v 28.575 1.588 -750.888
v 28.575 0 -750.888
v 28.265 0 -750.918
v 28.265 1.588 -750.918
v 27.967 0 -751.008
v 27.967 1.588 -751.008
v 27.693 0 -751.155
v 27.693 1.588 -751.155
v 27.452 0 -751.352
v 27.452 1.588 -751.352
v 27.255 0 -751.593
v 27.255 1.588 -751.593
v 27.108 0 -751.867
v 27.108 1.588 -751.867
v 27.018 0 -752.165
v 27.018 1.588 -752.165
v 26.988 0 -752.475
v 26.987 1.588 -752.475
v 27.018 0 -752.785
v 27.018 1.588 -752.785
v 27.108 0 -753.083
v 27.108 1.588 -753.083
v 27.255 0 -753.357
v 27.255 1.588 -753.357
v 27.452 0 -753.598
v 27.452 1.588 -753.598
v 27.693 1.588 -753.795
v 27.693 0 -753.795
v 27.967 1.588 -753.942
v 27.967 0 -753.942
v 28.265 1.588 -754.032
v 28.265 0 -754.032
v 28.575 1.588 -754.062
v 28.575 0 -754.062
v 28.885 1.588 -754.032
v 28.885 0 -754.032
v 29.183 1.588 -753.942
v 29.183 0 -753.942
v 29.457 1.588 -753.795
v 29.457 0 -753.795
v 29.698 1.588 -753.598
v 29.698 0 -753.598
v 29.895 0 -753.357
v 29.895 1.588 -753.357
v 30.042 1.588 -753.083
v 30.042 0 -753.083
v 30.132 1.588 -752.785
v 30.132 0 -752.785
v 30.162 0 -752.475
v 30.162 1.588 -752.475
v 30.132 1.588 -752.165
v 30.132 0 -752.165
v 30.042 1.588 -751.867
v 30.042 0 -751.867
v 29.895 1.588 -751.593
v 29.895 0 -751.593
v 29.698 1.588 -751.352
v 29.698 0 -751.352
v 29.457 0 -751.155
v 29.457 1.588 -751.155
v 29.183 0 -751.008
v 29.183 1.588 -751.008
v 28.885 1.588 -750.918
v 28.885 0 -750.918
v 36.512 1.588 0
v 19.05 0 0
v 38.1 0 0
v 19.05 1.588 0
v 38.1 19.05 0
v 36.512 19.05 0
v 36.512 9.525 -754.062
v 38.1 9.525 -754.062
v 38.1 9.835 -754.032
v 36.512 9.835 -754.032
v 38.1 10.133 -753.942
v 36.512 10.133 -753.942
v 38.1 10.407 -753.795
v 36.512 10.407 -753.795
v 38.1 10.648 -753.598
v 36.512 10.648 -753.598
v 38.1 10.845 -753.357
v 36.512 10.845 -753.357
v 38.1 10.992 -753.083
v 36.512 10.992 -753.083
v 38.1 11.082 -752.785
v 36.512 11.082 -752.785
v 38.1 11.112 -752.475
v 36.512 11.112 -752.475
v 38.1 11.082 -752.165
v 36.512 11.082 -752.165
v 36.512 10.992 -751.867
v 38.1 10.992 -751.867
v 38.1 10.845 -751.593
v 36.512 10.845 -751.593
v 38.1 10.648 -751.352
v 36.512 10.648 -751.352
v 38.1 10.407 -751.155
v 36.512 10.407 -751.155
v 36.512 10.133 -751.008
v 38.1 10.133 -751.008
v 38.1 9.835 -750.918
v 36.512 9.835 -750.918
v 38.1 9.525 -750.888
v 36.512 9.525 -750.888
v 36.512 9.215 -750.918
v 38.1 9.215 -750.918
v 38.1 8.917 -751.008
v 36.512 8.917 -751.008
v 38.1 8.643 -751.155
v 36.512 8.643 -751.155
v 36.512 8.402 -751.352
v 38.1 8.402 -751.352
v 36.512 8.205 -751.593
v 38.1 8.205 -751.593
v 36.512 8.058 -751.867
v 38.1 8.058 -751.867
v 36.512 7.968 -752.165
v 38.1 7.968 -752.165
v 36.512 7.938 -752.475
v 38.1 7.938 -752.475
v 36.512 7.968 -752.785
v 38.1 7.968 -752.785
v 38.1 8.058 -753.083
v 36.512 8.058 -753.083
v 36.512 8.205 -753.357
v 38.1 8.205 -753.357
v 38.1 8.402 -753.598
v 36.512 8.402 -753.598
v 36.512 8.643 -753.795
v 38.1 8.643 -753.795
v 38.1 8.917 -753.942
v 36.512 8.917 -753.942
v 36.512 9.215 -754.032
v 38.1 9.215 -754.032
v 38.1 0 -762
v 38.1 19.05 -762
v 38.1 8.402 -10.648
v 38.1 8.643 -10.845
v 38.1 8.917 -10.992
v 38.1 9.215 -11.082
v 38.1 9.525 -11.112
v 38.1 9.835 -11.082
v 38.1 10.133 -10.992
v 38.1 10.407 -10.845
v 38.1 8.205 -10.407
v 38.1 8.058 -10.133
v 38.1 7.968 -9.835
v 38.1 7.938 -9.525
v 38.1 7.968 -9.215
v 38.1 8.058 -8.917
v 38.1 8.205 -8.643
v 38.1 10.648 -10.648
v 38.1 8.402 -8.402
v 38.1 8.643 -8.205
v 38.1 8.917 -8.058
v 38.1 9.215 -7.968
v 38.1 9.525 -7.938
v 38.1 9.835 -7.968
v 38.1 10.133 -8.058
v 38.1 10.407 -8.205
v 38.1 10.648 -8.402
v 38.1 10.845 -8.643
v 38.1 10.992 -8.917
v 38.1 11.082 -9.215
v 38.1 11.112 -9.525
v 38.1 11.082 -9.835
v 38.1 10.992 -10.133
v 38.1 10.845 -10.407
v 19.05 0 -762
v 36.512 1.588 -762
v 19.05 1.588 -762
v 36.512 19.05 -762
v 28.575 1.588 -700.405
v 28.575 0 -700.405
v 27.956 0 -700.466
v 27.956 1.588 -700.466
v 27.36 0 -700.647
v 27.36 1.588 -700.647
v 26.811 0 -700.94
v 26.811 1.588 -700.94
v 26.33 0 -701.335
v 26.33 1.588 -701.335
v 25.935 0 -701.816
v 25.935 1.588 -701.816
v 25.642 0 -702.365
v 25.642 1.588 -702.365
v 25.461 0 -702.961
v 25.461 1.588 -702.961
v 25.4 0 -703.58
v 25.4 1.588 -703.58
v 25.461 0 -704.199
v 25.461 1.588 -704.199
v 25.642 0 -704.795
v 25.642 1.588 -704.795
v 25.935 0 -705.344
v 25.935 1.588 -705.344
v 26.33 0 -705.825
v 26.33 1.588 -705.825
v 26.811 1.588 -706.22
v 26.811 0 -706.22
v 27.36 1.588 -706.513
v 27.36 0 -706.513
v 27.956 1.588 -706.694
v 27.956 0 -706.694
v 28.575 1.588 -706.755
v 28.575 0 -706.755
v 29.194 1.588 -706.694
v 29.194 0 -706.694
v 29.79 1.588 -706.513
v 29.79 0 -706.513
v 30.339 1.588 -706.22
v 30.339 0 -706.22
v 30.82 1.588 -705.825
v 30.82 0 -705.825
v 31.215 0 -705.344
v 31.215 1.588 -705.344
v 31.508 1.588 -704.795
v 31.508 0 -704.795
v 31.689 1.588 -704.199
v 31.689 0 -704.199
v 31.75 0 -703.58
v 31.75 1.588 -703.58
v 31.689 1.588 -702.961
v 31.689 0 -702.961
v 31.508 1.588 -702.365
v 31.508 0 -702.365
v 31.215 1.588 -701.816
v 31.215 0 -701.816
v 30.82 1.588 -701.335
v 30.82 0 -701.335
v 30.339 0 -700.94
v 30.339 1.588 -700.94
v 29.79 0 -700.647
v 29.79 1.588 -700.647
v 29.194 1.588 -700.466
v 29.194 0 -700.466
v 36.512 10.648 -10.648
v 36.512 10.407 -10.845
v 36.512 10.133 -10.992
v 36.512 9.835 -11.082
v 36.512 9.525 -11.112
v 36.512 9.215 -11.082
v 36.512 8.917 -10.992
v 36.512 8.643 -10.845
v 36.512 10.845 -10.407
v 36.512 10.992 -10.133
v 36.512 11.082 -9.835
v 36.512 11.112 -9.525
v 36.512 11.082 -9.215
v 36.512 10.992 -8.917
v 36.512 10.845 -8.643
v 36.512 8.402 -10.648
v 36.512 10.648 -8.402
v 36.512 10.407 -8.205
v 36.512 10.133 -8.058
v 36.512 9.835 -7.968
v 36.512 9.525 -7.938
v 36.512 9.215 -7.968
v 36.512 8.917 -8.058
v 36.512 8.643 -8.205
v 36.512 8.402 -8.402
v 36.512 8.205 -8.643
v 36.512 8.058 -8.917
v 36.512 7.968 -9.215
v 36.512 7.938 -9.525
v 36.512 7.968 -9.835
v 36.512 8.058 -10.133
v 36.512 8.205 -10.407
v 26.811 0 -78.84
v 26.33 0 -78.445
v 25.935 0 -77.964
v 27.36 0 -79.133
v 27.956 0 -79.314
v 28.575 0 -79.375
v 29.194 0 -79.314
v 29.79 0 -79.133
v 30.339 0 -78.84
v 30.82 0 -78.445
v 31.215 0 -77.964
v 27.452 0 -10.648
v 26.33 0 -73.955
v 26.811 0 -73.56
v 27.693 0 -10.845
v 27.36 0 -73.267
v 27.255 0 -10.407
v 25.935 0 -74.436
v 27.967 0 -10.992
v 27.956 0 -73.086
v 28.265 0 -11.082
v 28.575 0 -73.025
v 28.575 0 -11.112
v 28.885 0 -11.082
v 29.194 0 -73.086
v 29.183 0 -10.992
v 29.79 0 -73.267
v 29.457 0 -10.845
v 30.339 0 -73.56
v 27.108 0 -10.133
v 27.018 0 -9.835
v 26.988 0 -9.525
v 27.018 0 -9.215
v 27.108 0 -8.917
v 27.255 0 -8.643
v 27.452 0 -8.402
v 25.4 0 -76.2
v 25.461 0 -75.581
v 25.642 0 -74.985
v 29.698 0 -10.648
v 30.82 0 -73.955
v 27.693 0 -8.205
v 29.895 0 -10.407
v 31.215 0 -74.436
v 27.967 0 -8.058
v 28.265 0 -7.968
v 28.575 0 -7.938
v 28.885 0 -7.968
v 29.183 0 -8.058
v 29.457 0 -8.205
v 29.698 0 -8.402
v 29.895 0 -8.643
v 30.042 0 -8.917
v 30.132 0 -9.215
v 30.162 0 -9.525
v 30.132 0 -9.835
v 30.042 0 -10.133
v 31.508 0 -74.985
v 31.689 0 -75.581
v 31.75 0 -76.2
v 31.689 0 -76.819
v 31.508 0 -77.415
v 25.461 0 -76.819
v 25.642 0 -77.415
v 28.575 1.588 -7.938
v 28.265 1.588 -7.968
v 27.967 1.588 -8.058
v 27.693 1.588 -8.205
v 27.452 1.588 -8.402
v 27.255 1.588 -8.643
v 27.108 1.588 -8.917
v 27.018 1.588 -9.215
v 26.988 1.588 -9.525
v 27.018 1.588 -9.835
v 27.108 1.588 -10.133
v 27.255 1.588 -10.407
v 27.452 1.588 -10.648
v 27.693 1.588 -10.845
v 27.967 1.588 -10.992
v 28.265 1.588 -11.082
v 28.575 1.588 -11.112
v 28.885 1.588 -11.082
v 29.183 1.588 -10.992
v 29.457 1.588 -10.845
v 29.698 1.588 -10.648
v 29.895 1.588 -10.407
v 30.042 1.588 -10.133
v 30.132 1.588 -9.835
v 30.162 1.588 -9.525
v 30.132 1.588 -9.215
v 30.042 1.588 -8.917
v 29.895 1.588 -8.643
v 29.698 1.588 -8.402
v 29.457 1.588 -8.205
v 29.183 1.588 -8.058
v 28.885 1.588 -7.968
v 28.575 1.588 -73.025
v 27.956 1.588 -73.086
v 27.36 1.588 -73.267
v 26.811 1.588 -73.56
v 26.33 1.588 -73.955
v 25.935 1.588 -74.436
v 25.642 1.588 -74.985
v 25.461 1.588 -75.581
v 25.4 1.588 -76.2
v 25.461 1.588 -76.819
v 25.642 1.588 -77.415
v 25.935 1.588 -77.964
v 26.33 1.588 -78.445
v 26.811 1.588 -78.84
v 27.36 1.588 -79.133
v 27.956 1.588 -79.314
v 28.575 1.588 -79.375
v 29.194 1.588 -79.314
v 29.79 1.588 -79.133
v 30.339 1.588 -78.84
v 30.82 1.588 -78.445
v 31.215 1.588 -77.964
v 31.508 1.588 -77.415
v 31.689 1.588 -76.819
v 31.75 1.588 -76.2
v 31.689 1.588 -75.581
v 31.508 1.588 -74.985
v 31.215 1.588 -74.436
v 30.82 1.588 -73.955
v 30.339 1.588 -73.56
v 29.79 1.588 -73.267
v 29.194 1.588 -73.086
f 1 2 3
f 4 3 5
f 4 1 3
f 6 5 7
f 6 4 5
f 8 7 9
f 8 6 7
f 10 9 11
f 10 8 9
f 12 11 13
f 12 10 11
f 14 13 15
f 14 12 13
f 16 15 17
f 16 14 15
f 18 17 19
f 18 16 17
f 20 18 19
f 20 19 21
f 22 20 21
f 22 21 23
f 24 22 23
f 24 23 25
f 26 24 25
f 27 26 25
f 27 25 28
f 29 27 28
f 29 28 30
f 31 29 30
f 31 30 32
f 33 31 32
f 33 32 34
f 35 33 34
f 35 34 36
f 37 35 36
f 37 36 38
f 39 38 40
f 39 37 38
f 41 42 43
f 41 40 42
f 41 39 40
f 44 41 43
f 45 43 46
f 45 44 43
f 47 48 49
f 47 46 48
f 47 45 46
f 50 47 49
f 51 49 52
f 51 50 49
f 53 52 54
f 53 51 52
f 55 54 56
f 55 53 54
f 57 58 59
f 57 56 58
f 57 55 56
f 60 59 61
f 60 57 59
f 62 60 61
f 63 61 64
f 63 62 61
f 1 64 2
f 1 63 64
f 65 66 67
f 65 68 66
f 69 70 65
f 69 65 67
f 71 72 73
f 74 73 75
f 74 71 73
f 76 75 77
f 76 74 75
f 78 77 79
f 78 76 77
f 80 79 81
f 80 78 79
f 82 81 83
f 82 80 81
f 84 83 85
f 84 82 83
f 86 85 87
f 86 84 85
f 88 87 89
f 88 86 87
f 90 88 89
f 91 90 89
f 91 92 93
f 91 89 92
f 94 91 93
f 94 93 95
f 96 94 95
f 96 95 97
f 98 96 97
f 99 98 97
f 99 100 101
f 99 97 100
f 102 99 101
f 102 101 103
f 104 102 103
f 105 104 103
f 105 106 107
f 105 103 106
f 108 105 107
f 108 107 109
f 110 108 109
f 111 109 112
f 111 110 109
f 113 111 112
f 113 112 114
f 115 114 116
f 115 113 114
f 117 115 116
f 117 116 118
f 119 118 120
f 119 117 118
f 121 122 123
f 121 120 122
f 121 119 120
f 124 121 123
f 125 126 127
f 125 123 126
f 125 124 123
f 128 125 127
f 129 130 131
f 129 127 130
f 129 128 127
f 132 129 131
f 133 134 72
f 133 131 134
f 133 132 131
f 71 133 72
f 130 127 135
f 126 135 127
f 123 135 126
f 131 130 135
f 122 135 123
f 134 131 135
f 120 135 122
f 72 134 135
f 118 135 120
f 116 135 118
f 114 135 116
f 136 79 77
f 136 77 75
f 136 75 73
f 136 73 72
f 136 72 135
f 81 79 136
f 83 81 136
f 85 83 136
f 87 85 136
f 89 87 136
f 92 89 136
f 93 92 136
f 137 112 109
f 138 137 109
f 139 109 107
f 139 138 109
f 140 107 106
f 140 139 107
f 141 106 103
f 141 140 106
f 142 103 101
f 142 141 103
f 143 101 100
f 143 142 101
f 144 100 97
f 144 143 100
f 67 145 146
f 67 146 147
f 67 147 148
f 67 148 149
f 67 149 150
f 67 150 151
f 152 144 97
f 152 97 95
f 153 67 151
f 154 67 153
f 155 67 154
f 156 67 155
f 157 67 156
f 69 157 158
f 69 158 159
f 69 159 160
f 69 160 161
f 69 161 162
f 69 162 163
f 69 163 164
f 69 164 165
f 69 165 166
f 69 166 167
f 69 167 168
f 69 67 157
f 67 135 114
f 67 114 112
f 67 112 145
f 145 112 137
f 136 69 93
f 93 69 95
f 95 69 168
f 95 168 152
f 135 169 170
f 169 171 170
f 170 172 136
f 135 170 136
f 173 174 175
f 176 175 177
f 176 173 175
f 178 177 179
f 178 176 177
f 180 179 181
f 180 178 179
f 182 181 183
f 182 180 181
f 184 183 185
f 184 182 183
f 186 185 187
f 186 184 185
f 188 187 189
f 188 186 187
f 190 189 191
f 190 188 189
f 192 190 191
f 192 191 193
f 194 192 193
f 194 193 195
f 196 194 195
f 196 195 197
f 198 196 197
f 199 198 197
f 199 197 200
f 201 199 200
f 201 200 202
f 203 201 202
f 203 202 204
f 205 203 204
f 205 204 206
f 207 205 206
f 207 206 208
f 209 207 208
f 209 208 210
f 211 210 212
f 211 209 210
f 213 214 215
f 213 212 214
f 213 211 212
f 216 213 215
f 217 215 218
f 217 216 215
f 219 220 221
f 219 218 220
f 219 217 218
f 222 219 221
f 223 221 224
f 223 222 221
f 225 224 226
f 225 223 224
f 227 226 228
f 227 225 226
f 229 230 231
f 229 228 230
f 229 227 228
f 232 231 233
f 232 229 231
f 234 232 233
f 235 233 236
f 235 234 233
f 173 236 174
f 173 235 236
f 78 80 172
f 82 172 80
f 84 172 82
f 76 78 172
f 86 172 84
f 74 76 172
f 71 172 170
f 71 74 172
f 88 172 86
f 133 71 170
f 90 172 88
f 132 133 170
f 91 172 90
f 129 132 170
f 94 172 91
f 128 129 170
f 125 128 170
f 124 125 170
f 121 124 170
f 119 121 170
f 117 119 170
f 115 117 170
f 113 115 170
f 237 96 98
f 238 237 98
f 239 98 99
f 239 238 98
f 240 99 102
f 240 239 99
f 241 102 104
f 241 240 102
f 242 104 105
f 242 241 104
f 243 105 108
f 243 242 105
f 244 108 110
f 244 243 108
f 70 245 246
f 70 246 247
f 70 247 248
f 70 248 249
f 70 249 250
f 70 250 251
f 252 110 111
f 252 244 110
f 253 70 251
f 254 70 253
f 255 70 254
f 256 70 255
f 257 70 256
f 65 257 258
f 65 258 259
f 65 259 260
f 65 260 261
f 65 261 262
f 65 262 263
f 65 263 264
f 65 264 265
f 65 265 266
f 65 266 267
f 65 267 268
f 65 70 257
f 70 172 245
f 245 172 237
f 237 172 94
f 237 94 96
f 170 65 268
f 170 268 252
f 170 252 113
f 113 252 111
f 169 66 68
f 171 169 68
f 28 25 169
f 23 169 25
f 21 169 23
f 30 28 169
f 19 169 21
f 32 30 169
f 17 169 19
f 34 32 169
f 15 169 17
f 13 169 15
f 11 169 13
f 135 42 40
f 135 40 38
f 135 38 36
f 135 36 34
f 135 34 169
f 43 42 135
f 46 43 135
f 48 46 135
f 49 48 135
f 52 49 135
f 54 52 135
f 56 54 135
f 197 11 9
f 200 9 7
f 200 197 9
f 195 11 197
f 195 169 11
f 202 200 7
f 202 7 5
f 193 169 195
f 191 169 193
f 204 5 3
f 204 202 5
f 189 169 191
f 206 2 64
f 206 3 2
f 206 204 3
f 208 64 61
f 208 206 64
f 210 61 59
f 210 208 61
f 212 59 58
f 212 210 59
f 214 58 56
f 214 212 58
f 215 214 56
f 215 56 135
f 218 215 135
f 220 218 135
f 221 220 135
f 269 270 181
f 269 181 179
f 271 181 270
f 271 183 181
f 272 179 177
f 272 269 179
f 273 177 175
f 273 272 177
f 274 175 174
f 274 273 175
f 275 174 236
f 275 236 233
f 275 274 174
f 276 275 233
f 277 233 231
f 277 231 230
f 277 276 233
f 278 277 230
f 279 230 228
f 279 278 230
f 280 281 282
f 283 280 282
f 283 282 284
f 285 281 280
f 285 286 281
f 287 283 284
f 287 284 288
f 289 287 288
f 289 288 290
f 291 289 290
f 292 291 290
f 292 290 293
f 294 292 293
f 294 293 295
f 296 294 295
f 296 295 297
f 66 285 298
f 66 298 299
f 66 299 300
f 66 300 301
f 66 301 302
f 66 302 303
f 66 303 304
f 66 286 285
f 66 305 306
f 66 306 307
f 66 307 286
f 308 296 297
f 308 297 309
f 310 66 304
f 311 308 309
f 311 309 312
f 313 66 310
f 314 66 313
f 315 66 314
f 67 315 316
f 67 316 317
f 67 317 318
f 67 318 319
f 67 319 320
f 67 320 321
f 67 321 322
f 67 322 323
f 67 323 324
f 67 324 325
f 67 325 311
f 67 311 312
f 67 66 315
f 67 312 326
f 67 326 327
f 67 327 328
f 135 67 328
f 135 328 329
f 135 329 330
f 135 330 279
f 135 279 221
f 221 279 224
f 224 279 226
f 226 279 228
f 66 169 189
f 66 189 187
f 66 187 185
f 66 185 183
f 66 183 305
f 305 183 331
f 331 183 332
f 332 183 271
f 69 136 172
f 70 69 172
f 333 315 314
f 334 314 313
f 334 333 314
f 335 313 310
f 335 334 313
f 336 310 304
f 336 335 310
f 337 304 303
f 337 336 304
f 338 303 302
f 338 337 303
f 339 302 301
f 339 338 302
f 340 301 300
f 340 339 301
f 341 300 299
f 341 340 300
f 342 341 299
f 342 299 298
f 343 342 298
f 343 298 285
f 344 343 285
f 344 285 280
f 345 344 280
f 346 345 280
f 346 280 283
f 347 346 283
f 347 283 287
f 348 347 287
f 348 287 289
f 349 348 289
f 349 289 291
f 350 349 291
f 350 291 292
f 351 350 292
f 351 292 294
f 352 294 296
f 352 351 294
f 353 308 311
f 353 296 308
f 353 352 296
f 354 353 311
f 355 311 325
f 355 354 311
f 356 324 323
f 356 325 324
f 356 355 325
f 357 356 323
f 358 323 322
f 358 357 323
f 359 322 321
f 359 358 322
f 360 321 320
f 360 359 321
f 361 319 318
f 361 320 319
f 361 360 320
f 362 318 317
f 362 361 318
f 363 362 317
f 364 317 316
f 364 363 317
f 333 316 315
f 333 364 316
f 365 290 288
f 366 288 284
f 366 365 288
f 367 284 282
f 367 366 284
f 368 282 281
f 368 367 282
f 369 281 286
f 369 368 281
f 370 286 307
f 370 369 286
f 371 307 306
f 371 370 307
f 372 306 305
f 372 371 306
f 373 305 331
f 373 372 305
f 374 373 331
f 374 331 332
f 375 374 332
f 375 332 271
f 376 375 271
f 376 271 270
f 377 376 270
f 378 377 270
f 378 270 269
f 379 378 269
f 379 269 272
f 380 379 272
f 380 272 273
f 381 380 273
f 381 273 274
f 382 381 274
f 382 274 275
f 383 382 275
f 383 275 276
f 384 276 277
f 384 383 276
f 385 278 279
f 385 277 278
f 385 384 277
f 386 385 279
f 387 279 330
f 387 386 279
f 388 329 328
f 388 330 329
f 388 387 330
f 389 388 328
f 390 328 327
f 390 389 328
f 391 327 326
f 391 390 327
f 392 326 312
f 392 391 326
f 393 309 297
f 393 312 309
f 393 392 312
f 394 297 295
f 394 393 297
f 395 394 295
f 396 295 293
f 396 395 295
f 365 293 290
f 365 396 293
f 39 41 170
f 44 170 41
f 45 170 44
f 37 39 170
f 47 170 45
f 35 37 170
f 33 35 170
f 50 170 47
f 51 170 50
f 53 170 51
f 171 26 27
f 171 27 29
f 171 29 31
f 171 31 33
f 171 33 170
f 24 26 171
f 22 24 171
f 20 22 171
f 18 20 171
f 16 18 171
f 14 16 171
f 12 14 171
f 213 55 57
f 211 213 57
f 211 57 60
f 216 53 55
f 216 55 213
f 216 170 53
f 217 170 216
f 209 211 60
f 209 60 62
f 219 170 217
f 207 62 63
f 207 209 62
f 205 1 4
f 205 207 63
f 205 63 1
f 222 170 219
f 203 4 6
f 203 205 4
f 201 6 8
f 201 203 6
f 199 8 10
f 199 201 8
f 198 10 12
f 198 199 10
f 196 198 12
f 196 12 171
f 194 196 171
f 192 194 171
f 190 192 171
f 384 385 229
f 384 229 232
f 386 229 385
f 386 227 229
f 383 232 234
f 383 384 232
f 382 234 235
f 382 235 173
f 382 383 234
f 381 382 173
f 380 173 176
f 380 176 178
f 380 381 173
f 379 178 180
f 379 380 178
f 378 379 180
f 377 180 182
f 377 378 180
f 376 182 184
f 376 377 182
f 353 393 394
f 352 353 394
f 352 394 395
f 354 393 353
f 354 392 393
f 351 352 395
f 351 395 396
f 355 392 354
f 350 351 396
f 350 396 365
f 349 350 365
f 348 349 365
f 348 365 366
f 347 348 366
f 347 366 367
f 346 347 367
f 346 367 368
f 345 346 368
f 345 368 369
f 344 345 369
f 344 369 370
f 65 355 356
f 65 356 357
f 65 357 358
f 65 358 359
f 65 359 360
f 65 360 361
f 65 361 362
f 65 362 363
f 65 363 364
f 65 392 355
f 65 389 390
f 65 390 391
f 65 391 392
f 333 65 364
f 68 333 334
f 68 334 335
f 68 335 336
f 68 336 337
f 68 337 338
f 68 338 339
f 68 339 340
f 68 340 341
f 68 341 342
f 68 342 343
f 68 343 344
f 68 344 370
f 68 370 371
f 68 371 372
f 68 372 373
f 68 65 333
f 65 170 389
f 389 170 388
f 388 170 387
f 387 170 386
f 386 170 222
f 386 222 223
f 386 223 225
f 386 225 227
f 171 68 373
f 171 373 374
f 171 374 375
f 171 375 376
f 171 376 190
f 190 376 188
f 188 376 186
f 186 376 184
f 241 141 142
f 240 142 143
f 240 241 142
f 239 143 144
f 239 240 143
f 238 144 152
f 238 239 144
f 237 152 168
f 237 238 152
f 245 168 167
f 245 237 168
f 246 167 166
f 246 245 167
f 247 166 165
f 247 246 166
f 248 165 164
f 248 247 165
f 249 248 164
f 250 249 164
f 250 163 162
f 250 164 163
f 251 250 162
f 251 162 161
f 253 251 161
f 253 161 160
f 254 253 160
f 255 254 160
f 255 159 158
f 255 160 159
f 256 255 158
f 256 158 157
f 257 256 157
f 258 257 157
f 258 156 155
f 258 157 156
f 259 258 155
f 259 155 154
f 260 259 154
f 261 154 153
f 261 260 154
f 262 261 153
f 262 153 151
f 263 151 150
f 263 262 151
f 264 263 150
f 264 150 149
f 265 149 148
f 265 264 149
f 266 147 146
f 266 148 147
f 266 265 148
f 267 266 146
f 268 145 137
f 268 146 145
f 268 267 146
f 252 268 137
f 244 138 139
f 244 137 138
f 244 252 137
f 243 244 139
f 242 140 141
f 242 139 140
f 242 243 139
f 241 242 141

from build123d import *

# Parameters (mm, degrees)
BOSS_EXTRUDE1_DEPTH = 762
SKETCH2_R           = 1.5875
SKETCH2_R_2         = 3.175
CUT_EXTRUDE2_DEPTH  = 2.794
SKETCH4_R           = 1.5875
CUT_EXTRUDE3_DEPTH  = 8.89
SKETCH5_W           = 19.05
SKETCH5_H           = 19.05
CUT_EXTRUDE4_DEPTH  = 764.189696275


with BuildPart() as part:
    # Sketch1 → Boss-Extrude1 (new body)
    with BuildSketch(Plane.XY):
        Polygon((0, 0), (0, 19.05), (1.5875, 19.05), (1.5875, 1.5875), (19.05, 1.5875), (19.05, 0), align=None)
    boss_extrude1 = extrude(amount=-BOSS_EXTRUDE1_DEPTH)

    # Sketch2 → Cut-Extrude2 (cut)
    with BuildSketch(Plane(origin=(0, 1.5875, 0), x_dir=(1, 0, 0), z_dir=(0, 1, 0))):
        with Locations((9.525, 9.525)):
            Circle(SKETCH2_R)
        with Locations((9.525, 752.475)):
            Circle(SKETCH2_R)
        with Locations((9.525, 76.2)):
            Circle(SKETCH2_R_2)
        with Locations((9.525, 703.58)):
            Circle(SKETCH2_R_2)
    cut_extrude2 = extrude(amount=-CUT_EXTRUDE2_DEPTH, mode=Mode.SUBTRACT)

    # Sketch4 → Cut-Extrude3 (cut)
    with BuildSketch(Plane(origin=(1.5875, 0, 0), x_dir=(0, 0, -1), z_dir=(1, 0, 0))):
        with Locations((9.525, 9.525)):
            Circle(SKETCH4_R)
        with Locations((752.475, 9.525)):
            Circle(SKETCH4_R)
    cut_extrude3 = extrude(amount=-CUT_EXTRUDE3_DEPTH, mode=Mode.SUBTRACT)

    # Mirror1: Boss-Extrude1, Cut-Extrude2, Cut-Extrude3 across plane
    add(boss_extrude1.mirror(Plane(origin=(19.05, 0, -762), x_dir=(0, 0, 1), z_dir=(1, 0, 0))))
    add(cut_extrude2.mirror(Plane(origin=(19.05, 0, -762), x_dir=(0, 0, 1), z_dir=(1, 0, 0))), mode=Mode.SUBTRACT)
    add(cut_extrude3.mirror(Plane(origin=(19.05, 0, -762), x_dir=(0, 0, 1), z_dir=(1, 0, 0))), mode=Mode.SUBTRACT)

    # Sketch5 → Cut-Extrude4 (cut, through all)
    with BuildSketch(Plane.XY):
        with Locations((9.525, 9.525)):
            Rectangle(SKETCH5_W, SKETCH5_H)
    extrude(amount=-CUT_EXTRUDE4_DEPTH, mode=Mode.SUBTRACT)


solid = part.part
